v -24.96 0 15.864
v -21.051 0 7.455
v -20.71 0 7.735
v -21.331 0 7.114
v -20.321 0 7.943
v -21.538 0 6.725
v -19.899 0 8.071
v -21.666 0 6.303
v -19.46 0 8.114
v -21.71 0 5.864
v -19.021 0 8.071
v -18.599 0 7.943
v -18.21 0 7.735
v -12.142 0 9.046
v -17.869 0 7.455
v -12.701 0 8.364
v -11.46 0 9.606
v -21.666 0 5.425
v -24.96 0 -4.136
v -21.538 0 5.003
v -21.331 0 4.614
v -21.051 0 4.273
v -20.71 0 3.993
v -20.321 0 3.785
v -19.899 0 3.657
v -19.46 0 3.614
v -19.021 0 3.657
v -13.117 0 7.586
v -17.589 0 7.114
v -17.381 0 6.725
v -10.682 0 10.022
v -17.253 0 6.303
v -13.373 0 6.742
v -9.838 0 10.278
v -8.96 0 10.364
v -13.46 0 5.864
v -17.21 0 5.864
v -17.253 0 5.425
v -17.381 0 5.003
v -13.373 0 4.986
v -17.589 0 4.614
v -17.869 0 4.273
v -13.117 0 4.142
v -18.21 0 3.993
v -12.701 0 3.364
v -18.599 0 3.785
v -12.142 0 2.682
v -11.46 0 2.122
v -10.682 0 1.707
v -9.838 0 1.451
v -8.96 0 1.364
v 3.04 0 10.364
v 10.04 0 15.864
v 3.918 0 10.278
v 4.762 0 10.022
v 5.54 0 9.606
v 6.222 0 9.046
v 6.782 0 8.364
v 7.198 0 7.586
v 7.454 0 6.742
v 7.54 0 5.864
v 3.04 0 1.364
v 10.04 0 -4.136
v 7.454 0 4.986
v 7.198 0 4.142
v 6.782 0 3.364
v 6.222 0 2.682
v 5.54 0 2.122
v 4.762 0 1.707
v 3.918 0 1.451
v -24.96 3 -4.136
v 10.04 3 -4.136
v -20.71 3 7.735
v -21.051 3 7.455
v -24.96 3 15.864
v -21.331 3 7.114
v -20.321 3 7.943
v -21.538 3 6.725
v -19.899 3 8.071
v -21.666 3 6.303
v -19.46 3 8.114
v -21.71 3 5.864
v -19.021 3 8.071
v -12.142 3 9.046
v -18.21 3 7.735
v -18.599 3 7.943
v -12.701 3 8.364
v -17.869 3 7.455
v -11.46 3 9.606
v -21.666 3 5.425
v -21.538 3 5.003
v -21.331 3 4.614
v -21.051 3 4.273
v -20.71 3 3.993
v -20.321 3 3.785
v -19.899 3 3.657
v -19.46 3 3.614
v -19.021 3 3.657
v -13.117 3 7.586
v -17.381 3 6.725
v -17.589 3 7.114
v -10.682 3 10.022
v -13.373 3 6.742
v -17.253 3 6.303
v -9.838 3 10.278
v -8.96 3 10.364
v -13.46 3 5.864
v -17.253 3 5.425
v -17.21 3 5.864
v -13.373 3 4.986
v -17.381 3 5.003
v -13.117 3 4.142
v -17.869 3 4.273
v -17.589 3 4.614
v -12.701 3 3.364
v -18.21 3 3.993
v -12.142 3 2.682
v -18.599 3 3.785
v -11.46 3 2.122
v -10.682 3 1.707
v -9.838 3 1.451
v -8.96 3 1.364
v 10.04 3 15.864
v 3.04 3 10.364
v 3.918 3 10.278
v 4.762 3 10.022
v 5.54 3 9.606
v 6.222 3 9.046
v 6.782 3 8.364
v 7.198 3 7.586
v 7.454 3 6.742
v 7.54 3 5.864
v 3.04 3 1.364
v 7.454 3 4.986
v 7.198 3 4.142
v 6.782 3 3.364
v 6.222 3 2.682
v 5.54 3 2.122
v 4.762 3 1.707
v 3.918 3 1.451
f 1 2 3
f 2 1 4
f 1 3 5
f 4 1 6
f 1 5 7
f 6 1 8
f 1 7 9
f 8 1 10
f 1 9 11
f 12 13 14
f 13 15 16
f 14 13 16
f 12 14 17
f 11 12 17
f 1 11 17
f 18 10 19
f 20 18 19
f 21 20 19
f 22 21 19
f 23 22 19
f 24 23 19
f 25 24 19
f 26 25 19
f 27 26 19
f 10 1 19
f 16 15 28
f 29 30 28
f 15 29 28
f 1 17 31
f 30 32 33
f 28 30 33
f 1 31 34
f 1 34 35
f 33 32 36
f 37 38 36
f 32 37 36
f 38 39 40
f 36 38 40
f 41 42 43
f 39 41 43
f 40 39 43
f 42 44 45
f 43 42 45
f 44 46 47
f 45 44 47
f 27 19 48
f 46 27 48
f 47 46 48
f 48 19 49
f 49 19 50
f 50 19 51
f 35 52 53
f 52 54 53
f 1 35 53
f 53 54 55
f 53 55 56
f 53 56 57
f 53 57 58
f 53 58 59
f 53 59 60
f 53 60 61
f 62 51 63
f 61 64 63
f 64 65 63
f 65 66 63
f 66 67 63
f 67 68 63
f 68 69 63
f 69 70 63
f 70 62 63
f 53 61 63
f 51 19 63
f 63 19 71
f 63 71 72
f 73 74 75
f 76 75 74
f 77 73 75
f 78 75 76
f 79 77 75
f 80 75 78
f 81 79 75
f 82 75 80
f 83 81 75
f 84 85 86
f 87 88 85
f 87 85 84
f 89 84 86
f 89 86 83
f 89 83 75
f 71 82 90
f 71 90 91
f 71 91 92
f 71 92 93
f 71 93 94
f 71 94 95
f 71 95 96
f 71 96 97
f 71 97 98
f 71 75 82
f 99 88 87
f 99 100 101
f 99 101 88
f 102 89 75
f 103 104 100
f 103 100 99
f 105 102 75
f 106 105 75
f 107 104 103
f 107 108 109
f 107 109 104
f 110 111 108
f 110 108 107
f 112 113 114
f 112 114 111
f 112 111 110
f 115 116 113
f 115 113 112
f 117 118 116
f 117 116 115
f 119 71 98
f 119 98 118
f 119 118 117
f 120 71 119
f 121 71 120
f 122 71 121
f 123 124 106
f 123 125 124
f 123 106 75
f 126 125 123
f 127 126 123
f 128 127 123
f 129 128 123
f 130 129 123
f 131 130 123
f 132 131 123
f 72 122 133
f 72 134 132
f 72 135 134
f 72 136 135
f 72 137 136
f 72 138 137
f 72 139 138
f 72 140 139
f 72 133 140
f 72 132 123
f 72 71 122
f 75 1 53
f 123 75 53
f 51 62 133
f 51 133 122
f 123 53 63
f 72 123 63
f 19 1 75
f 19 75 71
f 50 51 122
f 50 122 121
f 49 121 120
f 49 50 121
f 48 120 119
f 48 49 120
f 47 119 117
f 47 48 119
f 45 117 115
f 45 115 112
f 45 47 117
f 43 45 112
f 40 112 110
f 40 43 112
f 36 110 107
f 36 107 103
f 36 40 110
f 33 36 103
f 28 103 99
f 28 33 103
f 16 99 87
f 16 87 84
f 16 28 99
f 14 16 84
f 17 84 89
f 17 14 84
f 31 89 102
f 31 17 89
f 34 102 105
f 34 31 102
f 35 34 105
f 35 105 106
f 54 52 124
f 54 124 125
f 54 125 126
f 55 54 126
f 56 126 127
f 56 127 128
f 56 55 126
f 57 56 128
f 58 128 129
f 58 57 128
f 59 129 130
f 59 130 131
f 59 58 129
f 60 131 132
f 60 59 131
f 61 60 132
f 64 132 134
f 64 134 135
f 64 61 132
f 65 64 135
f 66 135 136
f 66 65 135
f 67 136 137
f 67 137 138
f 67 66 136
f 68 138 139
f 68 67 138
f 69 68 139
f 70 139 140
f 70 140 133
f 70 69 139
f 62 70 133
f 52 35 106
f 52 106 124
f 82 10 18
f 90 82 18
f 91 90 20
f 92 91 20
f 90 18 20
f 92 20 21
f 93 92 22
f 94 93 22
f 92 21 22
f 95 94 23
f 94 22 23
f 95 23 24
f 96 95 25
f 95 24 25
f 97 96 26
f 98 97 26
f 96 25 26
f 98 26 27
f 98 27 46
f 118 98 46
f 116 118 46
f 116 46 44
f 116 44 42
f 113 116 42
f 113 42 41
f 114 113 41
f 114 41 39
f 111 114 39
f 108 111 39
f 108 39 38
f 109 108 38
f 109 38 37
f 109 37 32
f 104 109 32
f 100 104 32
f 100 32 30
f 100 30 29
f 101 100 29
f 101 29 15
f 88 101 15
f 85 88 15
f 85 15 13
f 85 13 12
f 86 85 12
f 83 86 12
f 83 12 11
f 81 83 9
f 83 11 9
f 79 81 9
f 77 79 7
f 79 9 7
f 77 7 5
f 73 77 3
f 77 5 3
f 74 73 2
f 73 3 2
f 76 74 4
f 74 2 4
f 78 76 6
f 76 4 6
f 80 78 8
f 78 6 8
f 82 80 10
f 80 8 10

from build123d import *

# Parameters (mm, degrees)
SKETCH1_W                = 35
SKETCH1_H                = 20
BOSS_EXTRUDE1_DEPTH      = 3
M8_CLEARANCE_SLOT1_DEPTH = 3
M4_CLEARANCE_SLOT1_D     = 4.5


# Read off the part's stored shape, not the designer's step: M8 Clearance Slot1
with BuildPart() as part:
    # Sketch1 → Boss-Extrude1 (new body)
    with BuildSketch(Plane(origin=(0, 0, 0), x_dir=(1, 0, 0), z_dir=(0, 1, 0))):
        with Locations((-7.459731544, -5.86409396)):
            Rectangle(SKETCH1_W, SKETCH1_H)
    extrude(amount=BOSS_EXTRUDE1_DEPTH)

    # M8 Clearance Slot1 outline → M8 Clearance Slot1 (cut)
    with BuildSketch(Plane(origin=(0, 0, 0), x_dir=(1, 0, 0), z_dir=(0, 1, 0))):
        with BuildLine():
            Line((-8.959731544, -10.36409396), (3.040268456, -10.36409396))
            ThreePointArc((3.040268456, -10.36409396), (7.540268456, -5.86409396), (3.040268456, -1.36409396))
            Line((3.040268456, -1.36409396), (-8.959731544, -1.36409396))
            ThreePointArc((-8.959731544, -1.36409396), (-13.459731544, -5.86409396), (-8.959731544, -10.36409396))
        make_face()
    extrude(amount=M8_CLEARANCE_SLOT1_DEPTH, mode=Mode.SUBTRACT)

    # M4 Clearance Slot1 (through all)
    with Locations(Plane(origin=(0, 3, 0), x_dir=(1, 0, 0), z_dir=(0, 1, 0))):
        with Locations((-19.459731544, -5.86409396)):
            Hole(M4_CLEARANCE_SLOT1_D / 2)


solid = part.part
